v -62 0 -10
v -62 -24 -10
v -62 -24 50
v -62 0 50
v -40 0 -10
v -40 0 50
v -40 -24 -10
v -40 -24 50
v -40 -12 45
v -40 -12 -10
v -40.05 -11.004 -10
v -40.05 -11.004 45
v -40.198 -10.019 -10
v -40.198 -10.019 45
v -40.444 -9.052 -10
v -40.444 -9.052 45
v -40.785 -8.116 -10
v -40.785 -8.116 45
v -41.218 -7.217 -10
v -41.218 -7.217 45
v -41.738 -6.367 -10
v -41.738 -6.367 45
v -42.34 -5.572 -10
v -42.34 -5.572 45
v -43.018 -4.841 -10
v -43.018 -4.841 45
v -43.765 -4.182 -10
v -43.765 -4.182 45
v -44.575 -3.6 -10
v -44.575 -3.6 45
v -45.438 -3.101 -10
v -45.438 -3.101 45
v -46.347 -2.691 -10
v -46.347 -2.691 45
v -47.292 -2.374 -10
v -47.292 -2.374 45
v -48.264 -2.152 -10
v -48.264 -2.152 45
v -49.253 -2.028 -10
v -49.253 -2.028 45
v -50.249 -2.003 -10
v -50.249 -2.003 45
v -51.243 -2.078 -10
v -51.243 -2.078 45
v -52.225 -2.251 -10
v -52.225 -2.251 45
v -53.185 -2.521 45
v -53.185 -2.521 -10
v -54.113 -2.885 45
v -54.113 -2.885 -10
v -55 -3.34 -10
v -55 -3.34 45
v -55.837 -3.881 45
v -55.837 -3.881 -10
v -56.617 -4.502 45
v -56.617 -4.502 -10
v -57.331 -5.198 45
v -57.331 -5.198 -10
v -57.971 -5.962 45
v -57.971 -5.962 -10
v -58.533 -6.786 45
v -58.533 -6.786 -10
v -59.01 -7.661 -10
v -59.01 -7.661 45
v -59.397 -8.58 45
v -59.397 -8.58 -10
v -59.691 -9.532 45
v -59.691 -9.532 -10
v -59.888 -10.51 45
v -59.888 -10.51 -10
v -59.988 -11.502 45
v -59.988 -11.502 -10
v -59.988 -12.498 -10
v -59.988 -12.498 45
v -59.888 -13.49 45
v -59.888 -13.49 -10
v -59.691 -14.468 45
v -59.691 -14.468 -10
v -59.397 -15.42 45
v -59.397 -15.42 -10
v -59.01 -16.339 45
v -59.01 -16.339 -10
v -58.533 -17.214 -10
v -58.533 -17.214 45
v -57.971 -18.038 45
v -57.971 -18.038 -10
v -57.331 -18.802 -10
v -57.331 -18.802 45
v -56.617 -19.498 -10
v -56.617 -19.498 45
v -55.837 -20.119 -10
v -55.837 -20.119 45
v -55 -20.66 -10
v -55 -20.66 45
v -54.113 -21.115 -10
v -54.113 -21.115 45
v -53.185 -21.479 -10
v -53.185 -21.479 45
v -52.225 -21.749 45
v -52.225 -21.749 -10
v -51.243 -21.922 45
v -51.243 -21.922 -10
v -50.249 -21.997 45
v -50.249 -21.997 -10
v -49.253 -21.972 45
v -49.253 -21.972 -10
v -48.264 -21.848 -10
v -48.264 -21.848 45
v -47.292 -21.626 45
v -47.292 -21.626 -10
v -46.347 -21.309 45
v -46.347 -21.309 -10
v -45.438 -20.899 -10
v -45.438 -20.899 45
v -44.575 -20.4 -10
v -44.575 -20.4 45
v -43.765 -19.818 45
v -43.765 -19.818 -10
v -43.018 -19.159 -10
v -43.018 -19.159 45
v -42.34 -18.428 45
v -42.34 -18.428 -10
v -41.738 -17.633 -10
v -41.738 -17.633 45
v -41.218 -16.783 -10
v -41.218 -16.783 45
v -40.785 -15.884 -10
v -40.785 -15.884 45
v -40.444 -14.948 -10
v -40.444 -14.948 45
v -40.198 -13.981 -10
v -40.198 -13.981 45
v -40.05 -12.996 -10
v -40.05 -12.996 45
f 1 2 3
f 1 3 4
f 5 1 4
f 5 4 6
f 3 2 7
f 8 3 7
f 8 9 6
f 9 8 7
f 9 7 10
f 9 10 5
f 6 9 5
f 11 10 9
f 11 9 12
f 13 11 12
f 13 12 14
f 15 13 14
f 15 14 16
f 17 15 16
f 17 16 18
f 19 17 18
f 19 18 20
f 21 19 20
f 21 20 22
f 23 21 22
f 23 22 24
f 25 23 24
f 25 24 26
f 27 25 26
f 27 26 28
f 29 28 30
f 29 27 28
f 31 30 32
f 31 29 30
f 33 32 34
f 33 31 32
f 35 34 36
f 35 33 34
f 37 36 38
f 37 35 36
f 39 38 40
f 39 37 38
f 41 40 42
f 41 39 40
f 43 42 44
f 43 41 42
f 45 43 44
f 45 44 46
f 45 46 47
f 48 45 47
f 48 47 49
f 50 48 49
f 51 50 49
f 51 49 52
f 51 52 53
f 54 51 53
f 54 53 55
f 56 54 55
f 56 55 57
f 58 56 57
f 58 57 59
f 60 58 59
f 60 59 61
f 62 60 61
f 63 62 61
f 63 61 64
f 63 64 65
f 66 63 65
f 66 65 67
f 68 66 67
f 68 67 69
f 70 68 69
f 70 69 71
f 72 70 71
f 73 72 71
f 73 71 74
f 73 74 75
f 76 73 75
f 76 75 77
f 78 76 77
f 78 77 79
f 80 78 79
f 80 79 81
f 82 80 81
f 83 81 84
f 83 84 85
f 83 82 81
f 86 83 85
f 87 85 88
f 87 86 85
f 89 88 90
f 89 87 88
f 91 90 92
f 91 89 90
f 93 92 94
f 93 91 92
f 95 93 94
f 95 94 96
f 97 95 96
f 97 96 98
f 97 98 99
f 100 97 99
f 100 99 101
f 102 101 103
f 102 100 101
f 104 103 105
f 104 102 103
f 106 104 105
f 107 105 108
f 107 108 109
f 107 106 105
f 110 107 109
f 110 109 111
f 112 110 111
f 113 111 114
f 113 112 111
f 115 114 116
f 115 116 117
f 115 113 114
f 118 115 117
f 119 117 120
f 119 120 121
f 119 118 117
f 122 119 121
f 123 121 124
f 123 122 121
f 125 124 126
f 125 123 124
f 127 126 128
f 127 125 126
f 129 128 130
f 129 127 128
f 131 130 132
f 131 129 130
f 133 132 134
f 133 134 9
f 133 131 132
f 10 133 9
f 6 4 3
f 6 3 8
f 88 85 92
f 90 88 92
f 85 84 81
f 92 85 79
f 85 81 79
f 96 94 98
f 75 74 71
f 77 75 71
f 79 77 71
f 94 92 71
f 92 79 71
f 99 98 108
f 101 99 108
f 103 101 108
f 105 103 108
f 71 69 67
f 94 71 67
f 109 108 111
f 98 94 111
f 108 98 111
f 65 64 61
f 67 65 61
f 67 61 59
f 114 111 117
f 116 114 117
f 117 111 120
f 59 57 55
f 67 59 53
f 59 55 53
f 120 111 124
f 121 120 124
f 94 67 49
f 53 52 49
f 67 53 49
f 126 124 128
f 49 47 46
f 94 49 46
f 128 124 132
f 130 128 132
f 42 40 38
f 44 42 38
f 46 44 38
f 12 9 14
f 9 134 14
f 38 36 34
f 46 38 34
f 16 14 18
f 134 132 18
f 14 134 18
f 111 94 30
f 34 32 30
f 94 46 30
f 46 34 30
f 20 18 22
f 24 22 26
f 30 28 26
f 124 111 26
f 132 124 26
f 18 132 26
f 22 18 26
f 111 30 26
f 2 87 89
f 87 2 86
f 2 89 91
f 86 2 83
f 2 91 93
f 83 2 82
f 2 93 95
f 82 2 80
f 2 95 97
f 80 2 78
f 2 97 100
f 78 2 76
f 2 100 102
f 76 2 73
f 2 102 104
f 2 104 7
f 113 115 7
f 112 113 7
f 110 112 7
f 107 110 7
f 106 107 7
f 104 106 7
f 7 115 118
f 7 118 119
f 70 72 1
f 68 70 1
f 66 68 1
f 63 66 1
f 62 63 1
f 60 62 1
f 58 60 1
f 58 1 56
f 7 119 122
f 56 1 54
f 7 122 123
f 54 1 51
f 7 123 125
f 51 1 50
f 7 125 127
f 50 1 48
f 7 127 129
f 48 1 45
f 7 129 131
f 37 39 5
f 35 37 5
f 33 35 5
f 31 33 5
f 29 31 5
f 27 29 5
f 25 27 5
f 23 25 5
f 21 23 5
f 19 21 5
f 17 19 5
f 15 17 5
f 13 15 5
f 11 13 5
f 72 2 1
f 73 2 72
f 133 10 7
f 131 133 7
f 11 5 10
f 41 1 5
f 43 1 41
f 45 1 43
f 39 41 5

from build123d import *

# Parameters (mm, degrees)
CYLINDER_R     = 10
CYLINDER_DEPTH = 60
BOX_W          = 22
BOX_H          = 24
BOX_DEPTH      = 60


with BuildPart() as cilindro:
    # Cylinder → Cylinder (new body)
    with BuildSketch(Plane(origin=(-50, -12, -15), x_dir=(1, 0, 0), z_dir=(0, 0, 1))):
        Circle(CYLINDER_R)
    extrude(amount=CYLINDER_DEPTH)


with BuildPart() as cut:
    # Box → Box (new body)
    with BuildSketch(Plane(origin=(-62, -24, -10), x_dir=(1, 0, 0), z_dir=(0, 0, 1))):
        with Locations((11, 12)):
            Rectangle(BOX_W, BOX_H)
    extrude(amount=BOX_DEPTH)

    # Cut: cut Cilindro
    add(cilindro.part, mode=Mode.SUBTRACT)


solid = cut.part
